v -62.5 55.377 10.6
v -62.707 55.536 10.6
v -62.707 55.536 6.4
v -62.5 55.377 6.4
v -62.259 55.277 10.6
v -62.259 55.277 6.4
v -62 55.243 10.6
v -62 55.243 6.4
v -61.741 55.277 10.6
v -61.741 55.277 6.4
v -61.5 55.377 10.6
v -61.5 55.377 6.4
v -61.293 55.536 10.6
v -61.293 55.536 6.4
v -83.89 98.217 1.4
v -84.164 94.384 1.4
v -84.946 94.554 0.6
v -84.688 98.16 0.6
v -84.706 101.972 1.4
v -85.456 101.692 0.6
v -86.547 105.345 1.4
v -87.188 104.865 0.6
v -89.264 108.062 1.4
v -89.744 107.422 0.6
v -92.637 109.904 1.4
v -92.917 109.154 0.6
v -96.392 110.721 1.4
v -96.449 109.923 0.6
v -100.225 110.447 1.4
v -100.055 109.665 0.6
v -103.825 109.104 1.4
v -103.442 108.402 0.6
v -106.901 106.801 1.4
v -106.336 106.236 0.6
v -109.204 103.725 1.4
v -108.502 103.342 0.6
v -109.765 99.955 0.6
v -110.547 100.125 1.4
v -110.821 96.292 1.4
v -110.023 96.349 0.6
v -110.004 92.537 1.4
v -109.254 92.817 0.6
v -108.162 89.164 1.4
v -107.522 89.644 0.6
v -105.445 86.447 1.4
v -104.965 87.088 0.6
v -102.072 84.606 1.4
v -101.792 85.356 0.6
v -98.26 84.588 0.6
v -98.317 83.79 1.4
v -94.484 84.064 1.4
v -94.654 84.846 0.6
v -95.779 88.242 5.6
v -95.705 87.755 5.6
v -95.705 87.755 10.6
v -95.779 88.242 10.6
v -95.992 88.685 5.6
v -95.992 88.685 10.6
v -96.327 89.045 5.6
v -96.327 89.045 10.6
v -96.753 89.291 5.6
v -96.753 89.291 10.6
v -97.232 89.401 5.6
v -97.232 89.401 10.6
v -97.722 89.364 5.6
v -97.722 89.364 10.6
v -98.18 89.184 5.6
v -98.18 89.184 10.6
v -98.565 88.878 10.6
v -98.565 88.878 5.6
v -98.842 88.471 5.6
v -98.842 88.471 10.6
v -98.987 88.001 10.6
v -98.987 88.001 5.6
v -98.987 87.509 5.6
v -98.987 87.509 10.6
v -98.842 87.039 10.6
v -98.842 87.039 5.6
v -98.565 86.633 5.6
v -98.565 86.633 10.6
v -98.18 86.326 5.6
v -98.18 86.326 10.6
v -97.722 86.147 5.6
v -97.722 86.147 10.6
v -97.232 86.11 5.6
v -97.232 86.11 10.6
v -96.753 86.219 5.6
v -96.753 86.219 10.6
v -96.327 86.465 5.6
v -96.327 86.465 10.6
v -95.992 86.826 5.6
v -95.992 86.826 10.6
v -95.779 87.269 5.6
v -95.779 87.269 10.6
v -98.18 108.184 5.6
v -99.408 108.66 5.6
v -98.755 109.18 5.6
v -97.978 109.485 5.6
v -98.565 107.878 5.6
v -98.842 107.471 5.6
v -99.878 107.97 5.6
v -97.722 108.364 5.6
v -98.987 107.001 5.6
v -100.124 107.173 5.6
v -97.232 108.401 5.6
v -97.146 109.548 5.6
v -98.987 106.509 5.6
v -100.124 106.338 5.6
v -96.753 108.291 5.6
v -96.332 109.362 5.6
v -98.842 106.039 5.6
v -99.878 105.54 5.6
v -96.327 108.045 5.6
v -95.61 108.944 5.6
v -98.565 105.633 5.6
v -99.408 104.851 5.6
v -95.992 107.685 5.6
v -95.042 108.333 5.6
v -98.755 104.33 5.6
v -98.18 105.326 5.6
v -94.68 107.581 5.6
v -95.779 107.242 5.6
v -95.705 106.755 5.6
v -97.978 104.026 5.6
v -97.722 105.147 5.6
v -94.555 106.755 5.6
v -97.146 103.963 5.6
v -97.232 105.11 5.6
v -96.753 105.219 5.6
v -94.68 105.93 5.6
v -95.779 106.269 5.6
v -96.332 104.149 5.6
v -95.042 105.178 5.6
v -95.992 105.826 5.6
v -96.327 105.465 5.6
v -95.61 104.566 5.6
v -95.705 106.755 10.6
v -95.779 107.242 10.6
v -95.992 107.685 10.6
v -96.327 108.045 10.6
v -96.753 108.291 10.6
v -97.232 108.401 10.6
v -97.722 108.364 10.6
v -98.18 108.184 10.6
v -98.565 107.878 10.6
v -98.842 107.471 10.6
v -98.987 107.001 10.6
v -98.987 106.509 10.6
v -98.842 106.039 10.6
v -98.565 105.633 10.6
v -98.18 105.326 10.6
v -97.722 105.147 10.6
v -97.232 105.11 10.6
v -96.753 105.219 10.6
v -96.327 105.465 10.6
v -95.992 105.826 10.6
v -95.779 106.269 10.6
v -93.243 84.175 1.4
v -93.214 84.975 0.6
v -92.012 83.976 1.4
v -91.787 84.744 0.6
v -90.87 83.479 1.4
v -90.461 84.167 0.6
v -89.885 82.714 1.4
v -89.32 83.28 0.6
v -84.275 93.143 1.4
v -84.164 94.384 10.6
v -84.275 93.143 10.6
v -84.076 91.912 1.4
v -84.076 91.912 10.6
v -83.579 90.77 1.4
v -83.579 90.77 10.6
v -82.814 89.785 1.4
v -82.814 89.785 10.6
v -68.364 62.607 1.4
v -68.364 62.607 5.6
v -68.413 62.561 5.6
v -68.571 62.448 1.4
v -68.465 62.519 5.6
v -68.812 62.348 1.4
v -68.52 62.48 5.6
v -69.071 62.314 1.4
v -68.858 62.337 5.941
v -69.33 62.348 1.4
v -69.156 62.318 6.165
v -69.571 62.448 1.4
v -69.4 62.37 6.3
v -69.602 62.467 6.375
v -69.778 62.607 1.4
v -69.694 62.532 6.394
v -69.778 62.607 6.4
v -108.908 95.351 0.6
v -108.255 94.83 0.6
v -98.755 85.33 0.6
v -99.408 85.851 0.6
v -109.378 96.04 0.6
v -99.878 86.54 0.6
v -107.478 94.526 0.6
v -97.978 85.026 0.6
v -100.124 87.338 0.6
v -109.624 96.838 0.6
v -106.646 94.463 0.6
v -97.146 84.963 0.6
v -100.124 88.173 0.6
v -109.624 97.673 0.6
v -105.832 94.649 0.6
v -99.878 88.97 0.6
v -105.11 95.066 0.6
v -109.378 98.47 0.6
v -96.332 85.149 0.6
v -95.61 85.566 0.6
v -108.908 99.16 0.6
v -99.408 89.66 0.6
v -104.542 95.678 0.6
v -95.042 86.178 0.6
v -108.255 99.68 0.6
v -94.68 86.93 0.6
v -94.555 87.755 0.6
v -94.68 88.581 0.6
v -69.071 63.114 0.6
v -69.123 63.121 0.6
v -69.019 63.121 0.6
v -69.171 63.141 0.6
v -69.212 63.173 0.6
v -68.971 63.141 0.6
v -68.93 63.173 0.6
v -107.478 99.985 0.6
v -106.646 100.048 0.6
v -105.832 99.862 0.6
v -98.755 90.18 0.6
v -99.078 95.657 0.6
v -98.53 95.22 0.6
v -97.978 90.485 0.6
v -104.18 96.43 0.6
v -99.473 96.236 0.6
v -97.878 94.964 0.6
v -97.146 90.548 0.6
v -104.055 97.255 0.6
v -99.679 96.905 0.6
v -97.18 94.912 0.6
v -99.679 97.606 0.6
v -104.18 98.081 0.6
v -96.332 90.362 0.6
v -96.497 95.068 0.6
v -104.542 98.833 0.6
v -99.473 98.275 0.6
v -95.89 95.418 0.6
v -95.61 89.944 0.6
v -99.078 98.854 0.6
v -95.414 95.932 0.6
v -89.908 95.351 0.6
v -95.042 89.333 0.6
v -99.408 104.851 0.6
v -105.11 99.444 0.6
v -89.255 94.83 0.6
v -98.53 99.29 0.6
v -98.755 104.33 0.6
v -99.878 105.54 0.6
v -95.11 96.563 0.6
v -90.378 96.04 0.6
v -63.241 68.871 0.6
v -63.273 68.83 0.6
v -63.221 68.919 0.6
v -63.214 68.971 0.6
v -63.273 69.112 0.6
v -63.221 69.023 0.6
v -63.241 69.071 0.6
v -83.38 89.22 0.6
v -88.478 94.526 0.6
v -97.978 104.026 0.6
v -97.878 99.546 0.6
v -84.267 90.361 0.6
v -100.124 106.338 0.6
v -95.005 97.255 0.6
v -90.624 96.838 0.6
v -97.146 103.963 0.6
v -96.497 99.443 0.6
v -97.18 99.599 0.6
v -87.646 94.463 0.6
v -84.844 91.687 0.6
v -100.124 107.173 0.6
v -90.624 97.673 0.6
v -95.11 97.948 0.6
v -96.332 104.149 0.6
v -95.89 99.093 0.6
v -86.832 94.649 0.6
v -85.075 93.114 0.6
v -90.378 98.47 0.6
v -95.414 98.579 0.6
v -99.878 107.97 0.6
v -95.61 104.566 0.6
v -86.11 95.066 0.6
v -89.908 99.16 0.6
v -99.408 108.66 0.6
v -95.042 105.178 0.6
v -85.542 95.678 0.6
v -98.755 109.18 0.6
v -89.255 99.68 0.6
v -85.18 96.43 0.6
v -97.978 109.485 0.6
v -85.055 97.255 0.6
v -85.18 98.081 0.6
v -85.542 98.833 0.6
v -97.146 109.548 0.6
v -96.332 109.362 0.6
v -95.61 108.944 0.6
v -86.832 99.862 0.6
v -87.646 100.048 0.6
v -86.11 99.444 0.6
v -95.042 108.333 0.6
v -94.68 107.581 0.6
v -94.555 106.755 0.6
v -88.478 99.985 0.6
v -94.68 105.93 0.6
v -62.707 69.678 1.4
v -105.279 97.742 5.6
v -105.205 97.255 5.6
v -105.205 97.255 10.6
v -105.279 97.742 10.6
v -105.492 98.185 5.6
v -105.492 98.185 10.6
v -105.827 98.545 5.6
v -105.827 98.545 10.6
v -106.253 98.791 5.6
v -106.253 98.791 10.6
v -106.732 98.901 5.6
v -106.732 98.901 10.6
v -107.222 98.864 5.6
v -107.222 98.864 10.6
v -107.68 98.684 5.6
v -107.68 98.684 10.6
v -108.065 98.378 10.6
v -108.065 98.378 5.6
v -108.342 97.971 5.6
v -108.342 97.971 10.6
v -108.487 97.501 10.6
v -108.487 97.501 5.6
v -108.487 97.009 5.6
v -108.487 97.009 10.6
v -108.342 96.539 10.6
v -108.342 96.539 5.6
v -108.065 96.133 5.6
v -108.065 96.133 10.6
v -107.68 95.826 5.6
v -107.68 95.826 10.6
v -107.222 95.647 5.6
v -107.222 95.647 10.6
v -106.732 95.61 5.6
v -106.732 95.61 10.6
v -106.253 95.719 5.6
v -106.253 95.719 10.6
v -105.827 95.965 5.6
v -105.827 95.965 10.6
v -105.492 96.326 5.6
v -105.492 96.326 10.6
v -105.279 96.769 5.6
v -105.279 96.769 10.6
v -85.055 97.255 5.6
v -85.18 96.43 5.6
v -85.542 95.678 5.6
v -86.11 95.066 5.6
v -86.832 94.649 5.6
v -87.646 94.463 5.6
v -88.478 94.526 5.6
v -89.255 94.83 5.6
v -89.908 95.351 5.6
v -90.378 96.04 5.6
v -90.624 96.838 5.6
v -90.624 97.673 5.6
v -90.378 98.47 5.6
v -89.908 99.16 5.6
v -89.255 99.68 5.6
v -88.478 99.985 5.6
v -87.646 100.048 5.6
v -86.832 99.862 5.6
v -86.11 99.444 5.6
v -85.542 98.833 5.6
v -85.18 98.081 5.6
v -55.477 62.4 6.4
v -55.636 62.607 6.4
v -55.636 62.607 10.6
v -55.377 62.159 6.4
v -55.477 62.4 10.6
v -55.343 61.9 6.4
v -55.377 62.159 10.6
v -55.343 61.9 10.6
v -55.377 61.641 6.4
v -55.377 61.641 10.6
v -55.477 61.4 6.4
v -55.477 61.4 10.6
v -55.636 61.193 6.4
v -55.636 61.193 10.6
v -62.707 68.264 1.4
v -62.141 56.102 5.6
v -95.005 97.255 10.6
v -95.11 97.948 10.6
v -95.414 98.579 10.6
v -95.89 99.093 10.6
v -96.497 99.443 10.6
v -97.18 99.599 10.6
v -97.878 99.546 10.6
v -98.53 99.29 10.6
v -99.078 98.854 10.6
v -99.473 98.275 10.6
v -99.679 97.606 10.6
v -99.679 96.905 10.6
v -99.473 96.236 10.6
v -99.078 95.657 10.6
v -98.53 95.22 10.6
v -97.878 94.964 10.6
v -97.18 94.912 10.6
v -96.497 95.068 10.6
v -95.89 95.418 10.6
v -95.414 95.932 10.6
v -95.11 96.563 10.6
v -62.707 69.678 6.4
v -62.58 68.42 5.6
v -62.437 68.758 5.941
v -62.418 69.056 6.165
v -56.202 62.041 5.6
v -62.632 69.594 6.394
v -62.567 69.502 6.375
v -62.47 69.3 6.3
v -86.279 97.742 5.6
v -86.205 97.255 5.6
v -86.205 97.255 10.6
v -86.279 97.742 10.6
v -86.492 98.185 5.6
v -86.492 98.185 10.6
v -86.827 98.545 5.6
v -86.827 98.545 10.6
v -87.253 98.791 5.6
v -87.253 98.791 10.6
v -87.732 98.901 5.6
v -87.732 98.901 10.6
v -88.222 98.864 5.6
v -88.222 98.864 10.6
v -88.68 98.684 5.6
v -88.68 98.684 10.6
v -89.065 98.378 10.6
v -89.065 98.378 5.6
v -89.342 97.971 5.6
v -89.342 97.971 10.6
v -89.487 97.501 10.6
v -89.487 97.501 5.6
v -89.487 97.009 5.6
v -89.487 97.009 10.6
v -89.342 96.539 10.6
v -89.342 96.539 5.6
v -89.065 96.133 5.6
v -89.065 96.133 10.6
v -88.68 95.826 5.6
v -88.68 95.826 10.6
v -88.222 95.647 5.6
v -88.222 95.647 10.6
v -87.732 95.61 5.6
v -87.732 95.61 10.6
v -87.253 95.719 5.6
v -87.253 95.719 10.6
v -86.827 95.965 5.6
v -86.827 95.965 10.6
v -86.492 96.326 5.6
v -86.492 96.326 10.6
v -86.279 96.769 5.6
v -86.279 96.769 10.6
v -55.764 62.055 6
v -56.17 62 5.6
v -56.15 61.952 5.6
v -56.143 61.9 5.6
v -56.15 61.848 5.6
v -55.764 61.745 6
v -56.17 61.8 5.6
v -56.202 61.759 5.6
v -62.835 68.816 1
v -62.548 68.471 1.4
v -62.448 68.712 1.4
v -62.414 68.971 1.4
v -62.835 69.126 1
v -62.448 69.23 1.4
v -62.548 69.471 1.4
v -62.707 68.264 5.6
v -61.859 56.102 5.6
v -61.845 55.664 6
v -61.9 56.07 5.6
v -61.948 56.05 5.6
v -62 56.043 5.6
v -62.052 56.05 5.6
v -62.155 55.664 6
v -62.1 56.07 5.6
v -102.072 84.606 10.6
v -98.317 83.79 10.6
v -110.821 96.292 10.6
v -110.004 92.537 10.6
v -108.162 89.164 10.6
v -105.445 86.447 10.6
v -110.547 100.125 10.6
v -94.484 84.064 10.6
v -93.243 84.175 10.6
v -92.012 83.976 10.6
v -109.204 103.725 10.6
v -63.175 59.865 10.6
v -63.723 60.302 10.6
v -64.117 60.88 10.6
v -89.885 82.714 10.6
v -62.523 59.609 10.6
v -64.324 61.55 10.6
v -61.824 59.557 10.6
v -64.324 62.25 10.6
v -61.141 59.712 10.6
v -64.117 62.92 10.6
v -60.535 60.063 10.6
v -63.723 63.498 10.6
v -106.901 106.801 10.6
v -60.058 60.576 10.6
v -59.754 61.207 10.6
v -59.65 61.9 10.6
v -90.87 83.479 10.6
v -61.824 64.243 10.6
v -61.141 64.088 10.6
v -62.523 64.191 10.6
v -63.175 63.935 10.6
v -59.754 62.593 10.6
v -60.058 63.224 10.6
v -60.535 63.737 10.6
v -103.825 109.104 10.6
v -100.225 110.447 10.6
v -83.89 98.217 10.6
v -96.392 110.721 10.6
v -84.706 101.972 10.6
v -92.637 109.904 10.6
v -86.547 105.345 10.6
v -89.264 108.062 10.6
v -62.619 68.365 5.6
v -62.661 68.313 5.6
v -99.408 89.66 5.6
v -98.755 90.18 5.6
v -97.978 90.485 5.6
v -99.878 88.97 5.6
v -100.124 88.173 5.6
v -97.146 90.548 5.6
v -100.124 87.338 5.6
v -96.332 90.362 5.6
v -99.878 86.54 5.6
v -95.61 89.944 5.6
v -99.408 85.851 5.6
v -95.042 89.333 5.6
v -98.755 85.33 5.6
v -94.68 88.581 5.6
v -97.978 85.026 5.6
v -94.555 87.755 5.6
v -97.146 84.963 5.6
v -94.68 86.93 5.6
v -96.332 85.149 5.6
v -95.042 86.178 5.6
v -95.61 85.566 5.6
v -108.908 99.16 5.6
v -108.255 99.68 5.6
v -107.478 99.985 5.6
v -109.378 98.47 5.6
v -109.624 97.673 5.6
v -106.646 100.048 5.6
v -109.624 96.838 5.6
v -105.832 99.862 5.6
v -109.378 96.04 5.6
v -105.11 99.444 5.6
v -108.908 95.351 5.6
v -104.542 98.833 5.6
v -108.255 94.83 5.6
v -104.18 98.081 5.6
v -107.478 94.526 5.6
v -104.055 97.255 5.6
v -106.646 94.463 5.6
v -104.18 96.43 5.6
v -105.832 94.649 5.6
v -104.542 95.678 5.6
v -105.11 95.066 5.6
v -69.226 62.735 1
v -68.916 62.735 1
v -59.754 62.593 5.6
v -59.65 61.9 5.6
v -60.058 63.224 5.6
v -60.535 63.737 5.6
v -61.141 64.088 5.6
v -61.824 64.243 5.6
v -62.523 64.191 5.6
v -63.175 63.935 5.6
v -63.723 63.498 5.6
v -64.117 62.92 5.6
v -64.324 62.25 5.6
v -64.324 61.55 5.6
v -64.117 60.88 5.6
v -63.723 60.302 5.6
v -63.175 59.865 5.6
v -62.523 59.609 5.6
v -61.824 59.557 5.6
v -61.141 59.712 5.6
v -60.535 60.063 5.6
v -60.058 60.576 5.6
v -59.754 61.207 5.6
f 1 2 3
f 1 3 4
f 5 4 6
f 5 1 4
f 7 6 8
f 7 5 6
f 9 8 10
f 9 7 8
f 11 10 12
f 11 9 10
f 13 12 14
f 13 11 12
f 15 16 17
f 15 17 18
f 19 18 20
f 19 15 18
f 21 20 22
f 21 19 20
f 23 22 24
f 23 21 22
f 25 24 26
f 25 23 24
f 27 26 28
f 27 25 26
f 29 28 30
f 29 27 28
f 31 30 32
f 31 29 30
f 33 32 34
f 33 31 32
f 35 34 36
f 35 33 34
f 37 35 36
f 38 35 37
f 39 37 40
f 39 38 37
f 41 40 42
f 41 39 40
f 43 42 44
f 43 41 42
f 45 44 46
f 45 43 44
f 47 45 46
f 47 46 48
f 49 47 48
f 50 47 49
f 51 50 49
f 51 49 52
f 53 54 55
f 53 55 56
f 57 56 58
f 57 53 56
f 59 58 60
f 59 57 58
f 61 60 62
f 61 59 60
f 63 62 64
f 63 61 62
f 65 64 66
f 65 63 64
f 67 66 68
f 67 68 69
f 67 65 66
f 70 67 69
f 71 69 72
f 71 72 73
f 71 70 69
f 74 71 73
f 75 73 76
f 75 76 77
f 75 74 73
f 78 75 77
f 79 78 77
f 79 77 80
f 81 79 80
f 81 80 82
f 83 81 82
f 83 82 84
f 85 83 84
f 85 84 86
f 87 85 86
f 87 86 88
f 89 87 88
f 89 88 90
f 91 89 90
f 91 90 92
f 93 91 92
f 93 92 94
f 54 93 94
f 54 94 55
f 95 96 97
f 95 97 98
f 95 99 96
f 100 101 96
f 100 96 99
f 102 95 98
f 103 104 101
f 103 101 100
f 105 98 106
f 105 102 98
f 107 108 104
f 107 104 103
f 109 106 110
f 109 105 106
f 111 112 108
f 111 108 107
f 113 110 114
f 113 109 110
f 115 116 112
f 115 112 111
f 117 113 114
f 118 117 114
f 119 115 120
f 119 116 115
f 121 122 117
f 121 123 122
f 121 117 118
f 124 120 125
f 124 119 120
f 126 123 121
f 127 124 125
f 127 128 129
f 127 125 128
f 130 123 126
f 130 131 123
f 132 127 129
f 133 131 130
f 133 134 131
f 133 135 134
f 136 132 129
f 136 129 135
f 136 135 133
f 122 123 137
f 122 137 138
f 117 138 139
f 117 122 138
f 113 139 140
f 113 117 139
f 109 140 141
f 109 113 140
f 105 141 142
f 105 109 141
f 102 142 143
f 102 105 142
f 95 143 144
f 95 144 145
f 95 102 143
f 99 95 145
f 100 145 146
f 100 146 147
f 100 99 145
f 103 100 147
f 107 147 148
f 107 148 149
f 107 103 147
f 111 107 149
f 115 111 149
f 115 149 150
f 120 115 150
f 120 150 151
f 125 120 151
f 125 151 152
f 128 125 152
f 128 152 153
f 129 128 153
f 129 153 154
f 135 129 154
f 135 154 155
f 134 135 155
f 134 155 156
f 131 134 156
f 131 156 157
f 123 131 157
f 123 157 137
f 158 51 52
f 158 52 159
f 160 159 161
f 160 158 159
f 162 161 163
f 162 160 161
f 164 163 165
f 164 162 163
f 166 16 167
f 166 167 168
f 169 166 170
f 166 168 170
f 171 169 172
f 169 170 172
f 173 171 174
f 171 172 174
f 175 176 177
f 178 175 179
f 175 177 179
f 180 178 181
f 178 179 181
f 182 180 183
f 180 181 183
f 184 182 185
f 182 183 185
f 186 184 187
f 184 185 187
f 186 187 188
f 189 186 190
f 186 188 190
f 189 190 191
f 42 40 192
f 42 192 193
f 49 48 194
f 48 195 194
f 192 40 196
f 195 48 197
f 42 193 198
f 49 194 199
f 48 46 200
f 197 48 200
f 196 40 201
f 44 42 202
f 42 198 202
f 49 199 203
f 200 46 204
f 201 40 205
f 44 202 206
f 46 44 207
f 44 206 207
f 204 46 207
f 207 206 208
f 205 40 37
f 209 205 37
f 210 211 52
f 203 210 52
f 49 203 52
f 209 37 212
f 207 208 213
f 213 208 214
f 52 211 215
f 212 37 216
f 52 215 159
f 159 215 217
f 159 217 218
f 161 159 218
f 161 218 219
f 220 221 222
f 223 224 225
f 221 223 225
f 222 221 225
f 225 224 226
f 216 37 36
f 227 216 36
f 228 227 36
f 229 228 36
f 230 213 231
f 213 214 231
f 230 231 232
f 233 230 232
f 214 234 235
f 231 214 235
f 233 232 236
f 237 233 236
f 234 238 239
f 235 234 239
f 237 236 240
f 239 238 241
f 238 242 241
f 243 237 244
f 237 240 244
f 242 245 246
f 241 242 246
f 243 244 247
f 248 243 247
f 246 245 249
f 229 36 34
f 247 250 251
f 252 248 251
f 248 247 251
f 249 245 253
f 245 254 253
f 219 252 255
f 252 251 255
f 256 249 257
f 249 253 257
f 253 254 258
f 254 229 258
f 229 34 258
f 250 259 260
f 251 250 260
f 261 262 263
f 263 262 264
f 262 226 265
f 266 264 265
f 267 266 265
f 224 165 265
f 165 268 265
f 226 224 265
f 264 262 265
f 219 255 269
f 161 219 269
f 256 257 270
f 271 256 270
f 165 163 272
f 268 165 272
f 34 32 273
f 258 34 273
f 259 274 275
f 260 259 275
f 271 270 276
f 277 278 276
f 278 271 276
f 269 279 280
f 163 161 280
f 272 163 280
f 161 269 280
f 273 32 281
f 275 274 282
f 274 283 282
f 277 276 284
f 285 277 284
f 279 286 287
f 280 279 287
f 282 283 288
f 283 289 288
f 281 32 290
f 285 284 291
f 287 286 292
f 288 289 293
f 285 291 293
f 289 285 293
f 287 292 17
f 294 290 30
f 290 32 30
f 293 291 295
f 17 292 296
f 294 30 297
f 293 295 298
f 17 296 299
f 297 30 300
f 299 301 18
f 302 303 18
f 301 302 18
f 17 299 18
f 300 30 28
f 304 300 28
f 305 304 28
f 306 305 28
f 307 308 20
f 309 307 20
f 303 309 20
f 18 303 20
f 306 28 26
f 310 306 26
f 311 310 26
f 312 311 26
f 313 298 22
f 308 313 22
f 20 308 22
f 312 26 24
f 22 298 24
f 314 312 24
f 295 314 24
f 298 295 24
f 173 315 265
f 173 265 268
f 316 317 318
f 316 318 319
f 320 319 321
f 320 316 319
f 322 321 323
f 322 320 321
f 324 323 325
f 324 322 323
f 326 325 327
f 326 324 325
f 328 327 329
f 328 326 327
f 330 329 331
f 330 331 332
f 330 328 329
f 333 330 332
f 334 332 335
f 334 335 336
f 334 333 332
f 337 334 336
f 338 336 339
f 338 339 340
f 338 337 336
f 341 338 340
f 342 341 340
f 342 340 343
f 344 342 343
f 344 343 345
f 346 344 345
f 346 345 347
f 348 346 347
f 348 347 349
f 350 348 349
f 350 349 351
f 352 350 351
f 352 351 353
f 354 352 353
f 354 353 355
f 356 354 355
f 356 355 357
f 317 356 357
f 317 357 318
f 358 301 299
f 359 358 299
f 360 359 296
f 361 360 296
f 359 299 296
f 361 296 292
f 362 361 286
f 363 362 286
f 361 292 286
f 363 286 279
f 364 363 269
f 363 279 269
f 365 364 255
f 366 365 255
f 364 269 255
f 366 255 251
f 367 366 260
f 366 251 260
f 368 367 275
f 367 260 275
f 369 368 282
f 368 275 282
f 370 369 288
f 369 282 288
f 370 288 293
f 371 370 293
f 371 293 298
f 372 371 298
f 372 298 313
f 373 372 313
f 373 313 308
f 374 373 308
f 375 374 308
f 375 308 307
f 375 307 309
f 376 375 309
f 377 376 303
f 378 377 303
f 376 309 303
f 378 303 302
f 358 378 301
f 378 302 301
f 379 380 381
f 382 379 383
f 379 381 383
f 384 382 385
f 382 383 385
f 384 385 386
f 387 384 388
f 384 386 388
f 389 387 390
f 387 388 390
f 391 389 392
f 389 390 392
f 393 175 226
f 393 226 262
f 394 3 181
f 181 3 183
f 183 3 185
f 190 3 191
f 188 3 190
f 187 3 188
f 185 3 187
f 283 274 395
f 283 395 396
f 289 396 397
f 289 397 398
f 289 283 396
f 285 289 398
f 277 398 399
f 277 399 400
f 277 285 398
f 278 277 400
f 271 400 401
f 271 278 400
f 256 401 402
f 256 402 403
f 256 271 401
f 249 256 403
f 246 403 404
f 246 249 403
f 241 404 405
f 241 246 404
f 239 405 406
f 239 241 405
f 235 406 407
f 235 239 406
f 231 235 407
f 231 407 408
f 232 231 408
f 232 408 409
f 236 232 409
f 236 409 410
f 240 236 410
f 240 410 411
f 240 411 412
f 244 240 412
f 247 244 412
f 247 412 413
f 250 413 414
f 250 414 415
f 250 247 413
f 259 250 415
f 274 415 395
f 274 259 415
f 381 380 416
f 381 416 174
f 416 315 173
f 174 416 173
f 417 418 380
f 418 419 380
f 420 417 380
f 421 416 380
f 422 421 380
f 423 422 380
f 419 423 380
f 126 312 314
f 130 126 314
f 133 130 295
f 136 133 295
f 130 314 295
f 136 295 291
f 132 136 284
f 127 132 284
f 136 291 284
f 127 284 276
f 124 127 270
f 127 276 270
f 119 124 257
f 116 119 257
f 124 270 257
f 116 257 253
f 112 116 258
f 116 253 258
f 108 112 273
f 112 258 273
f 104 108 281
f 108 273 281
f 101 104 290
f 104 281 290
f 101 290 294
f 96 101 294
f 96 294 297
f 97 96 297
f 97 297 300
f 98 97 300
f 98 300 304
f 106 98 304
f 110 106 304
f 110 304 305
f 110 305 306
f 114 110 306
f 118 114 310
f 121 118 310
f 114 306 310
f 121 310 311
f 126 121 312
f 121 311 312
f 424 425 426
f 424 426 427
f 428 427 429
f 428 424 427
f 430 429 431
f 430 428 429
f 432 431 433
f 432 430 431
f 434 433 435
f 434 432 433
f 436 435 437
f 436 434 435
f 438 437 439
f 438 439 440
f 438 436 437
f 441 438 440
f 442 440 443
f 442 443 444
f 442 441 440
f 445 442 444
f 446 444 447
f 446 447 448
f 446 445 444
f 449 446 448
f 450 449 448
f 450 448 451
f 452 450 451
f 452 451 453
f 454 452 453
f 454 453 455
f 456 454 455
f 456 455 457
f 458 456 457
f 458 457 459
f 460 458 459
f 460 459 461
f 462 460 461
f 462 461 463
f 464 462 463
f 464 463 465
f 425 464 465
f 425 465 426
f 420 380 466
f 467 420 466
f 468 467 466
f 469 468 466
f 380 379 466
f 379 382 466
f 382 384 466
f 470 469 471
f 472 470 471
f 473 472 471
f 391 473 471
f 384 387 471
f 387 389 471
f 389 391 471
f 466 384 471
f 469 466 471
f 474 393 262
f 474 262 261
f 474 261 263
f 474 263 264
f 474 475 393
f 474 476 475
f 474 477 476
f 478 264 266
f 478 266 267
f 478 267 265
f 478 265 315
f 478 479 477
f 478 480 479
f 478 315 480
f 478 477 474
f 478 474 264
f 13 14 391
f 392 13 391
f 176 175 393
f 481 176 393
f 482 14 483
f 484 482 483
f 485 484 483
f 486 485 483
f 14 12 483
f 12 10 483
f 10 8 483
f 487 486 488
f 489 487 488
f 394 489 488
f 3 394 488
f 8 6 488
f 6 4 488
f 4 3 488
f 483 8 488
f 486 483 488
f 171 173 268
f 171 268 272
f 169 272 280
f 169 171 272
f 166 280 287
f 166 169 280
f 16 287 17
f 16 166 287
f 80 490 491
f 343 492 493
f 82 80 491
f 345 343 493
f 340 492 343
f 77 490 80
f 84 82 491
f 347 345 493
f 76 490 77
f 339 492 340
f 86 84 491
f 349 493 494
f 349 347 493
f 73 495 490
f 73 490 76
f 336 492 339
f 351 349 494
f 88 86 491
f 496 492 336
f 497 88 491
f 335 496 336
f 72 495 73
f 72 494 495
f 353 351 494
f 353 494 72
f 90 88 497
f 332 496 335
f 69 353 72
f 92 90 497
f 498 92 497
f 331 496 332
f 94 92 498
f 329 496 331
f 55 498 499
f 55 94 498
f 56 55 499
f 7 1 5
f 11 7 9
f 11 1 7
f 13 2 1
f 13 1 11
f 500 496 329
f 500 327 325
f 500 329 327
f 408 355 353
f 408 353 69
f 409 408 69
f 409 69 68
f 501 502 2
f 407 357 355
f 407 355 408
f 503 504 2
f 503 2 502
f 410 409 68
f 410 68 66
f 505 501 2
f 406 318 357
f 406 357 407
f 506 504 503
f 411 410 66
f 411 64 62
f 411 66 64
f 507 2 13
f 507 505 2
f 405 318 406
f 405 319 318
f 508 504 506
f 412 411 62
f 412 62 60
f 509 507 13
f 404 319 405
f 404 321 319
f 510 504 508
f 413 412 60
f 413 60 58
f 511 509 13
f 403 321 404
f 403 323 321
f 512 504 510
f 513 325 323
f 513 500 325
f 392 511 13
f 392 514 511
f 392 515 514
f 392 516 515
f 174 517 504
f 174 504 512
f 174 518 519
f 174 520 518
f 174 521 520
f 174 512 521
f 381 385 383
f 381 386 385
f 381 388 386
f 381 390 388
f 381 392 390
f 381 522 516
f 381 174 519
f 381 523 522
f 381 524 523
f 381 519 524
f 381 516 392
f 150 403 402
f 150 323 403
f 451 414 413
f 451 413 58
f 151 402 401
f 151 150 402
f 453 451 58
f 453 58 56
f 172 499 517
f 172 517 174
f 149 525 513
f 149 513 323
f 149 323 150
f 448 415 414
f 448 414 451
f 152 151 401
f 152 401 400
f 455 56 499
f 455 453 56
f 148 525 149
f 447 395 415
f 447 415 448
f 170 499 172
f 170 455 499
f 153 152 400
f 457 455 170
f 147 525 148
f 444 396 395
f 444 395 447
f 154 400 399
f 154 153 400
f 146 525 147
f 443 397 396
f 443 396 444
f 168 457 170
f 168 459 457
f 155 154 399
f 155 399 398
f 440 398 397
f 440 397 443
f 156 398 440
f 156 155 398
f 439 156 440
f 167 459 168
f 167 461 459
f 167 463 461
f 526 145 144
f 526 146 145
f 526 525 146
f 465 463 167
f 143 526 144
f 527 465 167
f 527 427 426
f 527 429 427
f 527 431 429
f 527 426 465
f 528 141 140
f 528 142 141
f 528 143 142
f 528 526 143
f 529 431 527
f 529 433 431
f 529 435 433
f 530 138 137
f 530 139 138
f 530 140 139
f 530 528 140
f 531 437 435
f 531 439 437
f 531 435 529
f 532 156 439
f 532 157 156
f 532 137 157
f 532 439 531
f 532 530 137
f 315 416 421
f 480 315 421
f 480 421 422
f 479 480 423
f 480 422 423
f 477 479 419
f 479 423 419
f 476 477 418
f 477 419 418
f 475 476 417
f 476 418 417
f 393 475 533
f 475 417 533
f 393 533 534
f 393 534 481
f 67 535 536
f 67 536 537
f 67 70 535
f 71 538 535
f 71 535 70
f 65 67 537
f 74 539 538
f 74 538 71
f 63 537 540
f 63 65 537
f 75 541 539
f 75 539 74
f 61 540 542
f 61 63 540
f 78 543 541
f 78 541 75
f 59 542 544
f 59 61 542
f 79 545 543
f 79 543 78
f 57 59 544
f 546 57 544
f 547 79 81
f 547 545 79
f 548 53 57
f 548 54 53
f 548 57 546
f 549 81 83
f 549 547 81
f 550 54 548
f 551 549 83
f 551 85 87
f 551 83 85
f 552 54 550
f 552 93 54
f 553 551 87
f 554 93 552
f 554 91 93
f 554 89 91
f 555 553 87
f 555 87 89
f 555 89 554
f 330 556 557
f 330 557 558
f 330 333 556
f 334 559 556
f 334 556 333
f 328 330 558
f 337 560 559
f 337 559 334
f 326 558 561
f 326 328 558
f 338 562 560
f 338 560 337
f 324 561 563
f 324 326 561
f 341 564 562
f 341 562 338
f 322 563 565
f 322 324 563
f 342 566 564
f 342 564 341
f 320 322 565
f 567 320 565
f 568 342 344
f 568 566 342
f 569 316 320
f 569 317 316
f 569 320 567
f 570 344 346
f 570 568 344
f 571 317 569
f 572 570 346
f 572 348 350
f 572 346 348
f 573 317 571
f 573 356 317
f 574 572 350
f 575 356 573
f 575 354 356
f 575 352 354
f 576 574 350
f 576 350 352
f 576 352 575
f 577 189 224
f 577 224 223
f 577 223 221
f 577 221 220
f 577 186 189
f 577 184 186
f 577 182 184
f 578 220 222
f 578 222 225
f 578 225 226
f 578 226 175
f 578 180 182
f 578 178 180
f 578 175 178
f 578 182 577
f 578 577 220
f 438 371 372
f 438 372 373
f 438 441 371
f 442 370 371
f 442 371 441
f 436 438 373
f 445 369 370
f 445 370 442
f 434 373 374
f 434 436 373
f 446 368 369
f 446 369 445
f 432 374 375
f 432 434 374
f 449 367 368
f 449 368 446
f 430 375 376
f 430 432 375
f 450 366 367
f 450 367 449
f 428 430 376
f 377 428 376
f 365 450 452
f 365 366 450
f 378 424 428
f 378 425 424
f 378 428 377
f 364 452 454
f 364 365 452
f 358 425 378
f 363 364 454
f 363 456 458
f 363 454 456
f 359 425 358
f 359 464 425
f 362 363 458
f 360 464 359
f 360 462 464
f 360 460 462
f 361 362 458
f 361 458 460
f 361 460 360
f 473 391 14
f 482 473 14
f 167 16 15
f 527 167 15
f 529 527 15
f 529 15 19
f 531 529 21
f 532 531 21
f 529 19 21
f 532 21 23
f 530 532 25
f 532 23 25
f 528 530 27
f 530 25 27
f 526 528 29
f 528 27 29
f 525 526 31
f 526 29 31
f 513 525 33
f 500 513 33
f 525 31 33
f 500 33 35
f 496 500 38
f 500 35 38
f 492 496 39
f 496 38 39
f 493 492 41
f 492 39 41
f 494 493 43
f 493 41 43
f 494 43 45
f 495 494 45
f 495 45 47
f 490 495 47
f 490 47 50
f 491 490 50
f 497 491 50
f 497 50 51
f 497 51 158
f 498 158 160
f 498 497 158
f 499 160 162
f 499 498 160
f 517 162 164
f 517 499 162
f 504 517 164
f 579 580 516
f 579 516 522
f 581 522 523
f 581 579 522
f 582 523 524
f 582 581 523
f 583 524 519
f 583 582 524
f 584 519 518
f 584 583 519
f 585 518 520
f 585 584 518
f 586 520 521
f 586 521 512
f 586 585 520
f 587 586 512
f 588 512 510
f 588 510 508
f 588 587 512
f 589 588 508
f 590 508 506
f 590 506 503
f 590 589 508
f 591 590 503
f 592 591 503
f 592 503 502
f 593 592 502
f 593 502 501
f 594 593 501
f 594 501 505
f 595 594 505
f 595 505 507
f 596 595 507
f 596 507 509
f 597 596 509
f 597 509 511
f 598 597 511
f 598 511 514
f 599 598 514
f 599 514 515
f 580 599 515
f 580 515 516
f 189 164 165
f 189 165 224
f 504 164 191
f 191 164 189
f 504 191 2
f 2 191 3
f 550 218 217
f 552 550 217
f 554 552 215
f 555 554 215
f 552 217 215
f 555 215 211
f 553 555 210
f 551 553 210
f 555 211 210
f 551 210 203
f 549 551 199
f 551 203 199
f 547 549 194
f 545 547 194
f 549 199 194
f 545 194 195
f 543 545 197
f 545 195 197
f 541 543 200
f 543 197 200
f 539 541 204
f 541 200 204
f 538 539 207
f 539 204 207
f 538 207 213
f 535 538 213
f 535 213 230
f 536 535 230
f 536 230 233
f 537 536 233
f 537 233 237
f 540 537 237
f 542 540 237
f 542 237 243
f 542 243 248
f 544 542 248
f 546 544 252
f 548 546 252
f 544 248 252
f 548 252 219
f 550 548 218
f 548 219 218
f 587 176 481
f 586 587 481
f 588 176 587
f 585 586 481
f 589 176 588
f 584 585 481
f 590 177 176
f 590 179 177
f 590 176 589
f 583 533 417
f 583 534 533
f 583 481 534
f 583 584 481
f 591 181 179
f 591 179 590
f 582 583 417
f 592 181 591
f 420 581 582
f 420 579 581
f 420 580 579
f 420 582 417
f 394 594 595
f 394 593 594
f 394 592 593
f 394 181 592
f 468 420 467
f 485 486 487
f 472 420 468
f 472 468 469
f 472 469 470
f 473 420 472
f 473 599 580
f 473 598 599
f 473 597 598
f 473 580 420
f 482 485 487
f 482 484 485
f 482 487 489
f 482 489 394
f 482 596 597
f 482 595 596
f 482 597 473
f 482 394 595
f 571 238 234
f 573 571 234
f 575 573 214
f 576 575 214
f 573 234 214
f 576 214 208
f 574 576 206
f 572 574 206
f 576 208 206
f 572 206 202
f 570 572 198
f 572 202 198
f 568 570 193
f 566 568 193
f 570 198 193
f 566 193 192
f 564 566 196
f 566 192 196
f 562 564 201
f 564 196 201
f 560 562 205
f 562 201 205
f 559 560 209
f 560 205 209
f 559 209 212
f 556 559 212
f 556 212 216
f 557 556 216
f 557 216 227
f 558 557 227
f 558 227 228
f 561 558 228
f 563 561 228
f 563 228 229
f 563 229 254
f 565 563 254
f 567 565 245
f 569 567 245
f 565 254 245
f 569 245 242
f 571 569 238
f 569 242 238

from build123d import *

# Parameters (mm, degrees)
SKETCH002_R     = 2.35
SKETCH002_R_2   = 1.65
PAD001_DEPTH    = 10
POCKET001_DEPTH = 5
SKETCH004_R     = 2.8
POCKET002_DEPTH = 5
FILLET004_R     = 5
FILLET005_R     = 1
CHAMFER009_SIZE = 0.8


with BuildPart() as part:
    # Sketch002 → Pad001 (new body)
    with BuildSketch(Plane.XY):
        with BuildLine():
            Line((0, 7.071068), (-22.952731, 30.023799))
            ThreePointArc((-22.952731, 30.023799), (-44.901281, 44.901281), (-30.023799, 22.952731))
            Line((-7.071068, 0), (-30.023799, 22.952731))
            Line((-7.071068, 0), (0, -7.071068))
            Line((0, -7.071068), (7.071068, 0))
            Line((7.071068, 0), (0, 7.071068))
        make_face()
        Circle(SKETCH002_R, mode=Mode.SUBTRACT)
        with Locations((-44.855339, 35.355339)):
            Circle(SKETCH002_R_2, mode=Mode.SUBTRACT)
        with Locations((-25.855339, 35.355339)):
            Circle(SKETCH002_R_2, mode=Mode.SUBTRACT)
        with Locations((-35.355339, 25.855339)):
            Circle(SKETCH002_R_2, mode=Mode.SUBTRACT)
        with Locations((-35.355339, 44.855339)):
            Circle(SKETCH002_R_2, mode=Mode.SUBTRACT)
        with Locations((-35.355339, 35.355339)):
            Circle(SKETCH002_R, mode=Mode.SUBTRACT)
    extrude(amount=PAD001_DEPTH)

    # Sketch003 (on Face13 of Pad001) → Pocket001 (cut)
    with BuildSketch(Plane(origin=(0, 0, 0), x_dir=(1, 0, 0), z_dir=(0, 0, -1))):
        Polygon((0, 7.071068), (-7.071068, 0), (0, -7.071068), (7.071068, 0), align=None)
    extrude(amount=-POCKET001_DEPTH, mode=Mode.SUBTRACT)

    # Sketch004 (on Face13 of Pad001) → Pocket002 (cut)
    with BuildSketch(Plane(origin=(0, 0, 0), x_dir=(1, 0, 0), z_dir=(0, 0, -1))):
        with Locations((-44.855339, -35.355339)):
            Circle(SKETCH004_R)
        with Locations((-35.355339, -25.855339)):
            Circle(SKETCH004_R)
        with Locations((-25.855339, -35.355339)):
            Circle(SKETCH004_R)
        with Locations((-35.355339, -44.855339)):
            Circle(SKETCH004_R)
    extrude(amount=-POCKET002_DEPTH, mode=Mode.SUBTRACT)

    # Fillet004
    fillet004_edges = [part.edges().sort_by_distance(p)[0] for p in [
        (-22.952731, 30.023799, 5),
        (-30.023799, 22.952731, 5),
    ]]
    fillet(fillet004_edges, radius=FILLET004_R)

    # Fillet005
    fillet005_edges = [part.edges().sort_by_distance(p)[0] for p in [
        (7.071068, 0, 7.5),
        (0, -7.071068, 7.5),
        (0, 7.071068, 2.5),
        (-7.071068, 0, 2.5),
    ]]
    fillet(fillet005_edges, radius=FILLET005_R)

    # Chamfer009
    chamfer009_edges = [part.edges().sort_by_distance(p)[0] for p in [
        (-3.535534, 3.535534, 0),
        (3.535534, -3.535534, 5),
    ]]
    chamfer(chamfer009_edges, length=CHAMFER009_SIZE)


with BuildPart() as part_1:
    # Body001 placement: moved
    add(part.part.moved(Location((-62, 61.9, 0.6))))


solid = part_1.part
